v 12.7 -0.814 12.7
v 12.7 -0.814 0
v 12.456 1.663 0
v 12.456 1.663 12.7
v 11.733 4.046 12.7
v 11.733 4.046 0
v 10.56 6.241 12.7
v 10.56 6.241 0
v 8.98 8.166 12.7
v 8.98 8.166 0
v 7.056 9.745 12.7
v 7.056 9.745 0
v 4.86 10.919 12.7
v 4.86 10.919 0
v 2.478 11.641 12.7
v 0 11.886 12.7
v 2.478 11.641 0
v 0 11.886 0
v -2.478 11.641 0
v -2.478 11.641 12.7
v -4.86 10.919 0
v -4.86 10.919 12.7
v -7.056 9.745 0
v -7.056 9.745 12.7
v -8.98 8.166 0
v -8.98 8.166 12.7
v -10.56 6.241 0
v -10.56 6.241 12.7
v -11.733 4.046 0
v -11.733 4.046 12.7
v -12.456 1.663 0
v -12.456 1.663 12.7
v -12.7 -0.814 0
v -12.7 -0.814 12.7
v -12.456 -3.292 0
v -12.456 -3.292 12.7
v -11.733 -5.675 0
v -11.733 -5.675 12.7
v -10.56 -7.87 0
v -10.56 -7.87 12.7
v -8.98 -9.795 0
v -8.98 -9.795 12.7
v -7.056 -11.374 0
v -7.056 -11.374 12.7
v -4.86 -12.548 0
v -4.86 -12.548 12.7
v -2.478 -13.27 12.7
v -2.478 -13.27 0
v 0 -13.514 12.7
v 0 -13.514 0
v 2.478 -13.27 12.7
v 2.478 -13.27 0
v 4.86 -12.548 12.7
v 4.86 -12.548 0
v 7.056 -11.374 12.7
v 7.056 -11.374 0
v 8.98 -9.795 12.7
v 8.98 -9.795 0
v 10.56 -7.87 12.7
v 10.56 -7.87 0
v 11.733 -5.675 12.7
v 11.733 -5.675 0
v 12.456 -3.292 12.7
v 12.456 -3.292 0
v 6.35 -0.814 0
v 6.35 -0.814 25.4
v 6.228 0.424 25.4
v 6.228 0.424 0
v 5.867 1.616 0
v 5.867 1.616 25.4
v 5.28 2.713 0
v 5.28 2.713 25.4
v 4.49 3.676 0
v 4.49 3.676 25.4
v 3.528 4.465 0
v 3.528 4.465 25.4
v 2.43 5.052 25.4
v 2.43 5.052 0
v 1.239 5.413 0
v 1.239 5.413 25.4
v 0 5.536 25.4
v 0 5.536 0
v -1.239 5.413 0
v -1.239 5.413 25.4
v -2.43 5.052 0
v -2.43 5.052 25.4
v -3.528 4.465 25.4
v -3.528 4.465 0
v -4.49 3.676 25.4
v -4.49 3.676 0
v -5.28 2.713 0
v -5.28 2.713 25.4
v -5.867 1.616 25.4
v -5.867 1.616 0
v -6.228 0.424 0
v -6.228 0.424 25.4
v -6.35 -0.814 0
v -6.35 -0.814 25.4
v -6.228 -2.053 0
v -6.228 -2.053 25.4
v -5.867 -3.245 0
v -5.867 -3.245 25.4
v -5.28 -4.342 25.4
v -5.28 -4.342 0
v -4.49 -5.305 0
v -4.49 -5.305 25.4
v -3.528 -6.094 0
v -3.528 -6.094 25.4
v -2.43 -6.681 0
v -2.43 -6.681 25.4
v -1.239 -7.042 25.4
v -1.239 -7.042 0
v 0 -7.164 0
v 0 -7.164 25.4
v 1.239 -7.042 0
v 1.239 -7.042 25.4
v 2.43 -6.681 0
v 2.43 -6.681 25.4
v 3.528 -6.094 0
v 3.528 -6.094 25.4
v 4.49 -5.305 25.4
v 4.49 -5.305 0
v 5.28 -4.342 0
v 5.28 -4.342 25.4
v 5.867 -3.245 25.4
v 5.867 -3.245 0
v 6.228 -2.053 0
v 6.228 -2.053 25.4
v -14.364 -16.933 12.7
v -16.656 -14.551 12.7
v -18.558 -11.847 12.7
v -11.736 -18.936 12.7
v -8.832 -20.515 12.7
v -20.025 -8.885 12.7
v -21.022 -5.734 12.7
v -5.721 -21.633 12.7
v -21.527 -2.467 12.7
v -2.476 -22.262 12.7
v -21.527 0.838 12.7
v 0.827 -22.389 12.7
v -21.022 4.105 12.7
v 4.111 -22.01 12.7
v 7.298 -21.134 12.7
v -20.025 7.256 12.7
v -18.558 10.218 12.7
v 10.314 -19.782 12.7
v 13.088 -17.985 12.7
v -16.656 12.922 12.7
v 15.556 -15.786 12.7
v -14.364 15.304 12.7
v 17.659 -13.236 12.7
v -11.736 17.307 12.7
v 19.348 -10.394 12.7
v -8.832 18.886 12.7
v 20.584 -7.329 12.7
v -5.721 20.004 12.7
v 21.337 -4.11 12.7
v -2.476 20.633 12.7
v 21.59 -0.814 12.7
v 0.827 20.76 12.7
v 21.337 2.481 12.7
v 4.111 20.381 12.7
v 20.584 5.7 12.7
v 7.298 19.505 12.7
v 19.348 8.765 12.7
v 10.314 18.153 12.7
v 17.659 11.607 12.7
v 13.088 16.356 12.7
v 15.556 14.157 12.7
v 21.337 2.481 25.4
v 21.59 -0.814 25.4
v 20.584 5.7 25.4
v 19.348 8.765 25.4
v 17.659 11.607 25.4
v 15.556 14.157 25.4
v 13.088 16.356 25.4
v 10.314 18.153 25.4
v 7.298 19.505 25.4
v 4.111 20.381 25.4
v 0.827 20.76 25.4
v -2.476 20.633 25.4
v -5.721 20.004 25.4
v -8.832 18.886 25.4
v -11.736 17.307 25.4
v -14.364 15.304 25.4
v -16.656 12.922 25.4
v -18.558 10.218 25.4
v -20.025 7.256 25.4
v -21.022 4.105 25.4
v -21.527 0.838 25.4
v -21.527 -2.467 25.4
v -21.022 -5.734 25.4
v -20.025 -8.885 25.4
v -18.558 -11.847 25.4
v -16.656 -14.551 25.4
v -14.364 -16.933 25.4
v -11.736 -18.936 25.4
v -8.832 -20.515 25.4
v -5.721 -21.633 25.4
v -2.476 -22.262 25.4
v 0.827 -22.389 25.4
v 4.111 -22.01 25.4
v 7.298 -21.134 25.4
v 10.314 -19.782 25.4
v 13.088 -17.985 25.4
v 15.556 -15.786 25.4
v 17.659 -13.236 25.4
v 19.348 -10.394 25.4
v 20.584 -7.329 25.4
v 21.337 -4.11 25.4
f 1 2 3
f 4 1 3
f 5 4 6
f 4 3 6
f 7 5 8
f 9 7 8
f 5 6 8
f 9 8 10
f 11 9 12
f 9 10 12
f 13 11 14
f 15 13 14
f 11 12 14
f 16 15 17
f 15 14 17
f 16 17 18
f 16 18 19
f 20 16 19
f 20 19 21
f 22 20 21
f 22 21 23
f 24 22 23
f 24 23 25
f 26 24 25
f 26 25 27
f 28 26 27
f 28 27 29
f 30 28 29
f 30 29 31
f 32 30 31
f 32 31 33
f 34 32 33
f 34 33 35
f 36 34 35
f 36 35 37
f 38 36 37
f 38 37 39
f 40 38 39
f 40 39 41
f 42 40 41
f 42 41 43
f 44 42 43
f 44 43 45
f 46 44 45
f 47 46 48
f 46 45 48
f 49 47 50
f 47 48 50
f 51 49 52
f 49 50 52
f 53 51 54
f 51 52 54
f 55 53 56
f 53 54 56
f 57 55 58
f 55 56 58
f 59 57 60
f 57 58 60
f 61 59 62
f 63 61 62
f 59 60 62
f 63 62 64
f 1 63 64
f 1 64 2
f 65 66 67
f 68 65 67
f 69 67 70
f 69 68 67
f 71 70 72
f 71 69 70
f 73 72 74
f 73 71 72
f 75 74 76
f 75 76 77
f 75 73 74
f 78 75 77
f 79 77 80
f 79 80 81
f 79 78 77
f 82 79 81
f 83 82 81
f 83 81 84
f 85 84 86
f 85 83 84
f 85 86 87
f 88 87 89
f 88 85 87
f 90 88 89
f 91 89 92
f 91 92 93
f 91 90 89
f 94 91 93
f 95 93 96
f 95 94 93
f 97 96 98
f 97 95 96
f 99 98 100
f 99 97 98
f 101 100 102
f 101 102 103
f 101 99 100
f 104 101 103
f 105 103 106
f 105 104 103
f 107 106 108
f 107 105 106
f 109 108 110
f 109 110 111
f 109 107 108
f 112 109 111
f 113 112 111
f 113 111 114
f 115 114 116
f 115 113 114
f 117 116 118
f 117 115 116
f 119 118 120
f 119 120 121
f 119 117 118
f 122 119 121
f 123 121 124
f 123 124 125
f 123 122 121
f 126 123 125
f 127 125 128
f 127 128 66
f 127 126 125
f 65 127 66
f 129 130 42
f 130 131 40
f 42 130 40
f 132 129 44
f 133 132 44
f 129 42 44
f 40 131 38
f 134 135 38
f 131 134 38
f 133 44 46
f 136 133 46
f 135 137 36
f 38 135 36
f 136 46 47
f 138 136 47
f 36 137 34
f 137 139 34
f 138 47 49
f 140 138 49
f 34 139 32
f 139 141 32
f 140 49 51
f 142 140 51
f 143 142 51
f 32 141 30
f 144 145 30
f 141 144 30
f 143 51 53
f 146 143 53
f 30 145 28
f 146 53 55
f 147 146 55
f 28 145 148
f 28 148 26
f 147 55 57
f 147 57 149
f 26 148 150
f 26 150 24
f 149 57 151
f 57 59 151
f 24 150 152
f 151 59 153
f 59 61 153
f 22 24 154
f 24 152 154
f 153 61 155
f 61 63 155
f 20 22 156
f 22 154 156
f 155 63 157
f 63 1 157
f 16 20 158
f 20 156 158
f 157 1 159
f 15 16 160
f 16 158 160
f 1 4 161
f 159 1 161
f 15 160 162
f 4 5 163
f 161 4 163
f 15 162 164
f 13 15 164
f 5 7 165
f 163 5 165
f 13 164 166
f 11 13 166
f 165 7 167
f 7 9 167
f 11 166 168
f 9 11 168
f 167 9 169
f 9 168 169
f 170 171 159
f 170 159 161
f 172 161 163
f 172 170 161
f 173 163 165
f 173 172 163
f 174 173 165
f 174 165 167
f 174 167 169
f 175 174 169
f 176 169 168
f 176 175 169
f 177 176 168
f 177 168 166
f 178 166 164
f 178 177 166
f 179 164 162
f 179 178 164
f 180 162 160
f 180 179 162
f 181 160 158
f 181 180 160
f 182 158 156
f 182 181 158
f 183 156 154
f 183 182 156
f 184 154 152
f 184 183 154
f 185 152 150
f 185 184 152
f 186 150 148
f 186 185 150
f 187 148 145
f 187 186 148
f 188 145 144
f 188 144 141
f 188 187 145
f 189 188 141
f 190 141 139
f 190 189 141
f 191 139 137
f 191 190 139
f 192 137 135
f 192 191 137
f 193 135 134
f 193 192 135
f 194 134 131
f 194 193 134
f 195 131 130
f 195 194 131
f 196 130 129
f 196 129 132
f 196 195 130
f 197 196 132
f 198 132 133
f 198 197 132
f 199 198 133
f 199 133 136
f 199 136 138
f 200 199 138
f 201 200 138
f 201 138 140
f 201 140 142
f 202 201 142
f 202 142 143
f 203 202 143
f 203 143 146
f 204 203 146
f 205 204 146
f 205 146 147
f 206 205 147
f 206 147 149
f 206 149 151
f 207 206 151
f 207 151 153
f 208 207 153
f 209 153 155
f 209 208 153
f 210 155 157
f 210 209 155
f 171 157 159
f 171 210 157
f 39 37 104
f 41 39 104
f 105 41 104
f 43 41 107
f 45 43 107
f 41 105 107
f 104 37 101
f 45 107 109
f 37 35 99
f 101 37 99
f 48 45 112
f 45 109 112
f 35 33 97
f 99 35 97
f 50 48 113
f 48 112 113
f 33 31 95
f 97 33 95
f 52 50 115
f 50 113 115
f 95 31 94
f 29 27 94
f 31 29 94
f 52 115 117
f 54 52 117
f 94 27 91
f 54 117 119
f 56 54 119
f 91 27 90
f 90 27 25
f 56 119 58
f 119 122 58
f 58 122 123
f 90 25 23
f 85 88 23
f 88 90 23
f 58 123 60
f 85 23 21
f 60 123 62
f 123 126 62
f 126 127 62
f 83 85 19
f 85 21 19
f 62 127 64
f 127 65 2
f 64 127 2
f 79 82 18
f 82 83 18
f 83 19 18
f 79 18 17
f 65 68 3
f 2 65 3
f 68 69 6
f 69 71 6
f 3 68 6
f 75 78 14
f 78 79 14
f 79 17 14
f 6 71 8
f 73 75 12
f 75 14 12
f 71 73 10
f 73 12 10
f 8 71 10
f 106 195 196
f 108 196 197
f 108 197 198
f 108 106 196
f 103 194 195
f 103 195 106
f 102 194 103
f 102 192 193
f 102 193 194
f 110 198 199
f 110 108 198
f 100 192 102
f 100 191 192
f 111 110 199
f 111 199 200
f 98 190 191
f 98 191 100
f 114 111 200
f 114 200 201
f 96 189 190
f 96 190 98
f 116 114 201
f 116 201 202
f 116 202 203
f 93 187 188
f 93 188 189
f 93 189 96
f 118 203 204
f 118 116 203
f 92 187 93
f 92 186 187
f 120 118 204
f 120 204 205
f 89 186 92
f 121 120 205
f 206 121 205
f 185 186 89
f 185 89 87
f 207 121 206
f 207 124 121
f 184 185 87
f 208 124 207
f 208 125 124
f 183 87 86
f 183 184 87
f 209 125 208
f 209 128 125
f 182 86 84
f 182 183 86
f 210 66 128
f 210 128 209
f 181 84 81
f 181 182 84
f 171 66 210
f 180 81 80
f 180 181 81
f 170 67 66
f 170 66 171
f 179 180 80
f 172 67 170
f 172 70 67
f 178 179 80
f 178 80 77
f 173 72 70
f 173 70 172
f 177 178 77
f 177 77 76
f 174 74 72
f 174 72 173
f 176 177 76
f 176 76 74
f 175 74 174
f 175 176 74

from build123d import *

# Parameters (mm, degrees)
F0_R     = 12.7
F0_R_2   = 6.35
F1_DEPTH = 25.4
F2_R     = 21.59
F2_R_2   = 12.7
F3_DEPTH = 12.7


with BuildPart() as f1:
    # F0 (on Top) → F1 (new body)
    with BuildSketch(Plane.XY):
        with Locations((0, 39.825506)):
            Circle(F0_R)
        with Locations((0, 39.825506)):
            Circle(F0_R_2, mode=Mode.SUBTRACT)
    extrude(amount=F1_DEPTH)

    # F2 (on face) → F3 (join)
    with BuildSketch(Plane.XY.offset(25.4)):
        with Locations((0, 39.825506)):
            Circle(F2_R)
        with Locations((0, 39.825506)):
            Circle(F2_R_2, mode=Mode.SUBTRACT)
    extrude(amount=-F3_DEPTH)


with BuildPart() as f1_1:
    # F4: moved
    add(f1.part.moved(Location((0, -40.64, 0))))


solid = f1_1.part
